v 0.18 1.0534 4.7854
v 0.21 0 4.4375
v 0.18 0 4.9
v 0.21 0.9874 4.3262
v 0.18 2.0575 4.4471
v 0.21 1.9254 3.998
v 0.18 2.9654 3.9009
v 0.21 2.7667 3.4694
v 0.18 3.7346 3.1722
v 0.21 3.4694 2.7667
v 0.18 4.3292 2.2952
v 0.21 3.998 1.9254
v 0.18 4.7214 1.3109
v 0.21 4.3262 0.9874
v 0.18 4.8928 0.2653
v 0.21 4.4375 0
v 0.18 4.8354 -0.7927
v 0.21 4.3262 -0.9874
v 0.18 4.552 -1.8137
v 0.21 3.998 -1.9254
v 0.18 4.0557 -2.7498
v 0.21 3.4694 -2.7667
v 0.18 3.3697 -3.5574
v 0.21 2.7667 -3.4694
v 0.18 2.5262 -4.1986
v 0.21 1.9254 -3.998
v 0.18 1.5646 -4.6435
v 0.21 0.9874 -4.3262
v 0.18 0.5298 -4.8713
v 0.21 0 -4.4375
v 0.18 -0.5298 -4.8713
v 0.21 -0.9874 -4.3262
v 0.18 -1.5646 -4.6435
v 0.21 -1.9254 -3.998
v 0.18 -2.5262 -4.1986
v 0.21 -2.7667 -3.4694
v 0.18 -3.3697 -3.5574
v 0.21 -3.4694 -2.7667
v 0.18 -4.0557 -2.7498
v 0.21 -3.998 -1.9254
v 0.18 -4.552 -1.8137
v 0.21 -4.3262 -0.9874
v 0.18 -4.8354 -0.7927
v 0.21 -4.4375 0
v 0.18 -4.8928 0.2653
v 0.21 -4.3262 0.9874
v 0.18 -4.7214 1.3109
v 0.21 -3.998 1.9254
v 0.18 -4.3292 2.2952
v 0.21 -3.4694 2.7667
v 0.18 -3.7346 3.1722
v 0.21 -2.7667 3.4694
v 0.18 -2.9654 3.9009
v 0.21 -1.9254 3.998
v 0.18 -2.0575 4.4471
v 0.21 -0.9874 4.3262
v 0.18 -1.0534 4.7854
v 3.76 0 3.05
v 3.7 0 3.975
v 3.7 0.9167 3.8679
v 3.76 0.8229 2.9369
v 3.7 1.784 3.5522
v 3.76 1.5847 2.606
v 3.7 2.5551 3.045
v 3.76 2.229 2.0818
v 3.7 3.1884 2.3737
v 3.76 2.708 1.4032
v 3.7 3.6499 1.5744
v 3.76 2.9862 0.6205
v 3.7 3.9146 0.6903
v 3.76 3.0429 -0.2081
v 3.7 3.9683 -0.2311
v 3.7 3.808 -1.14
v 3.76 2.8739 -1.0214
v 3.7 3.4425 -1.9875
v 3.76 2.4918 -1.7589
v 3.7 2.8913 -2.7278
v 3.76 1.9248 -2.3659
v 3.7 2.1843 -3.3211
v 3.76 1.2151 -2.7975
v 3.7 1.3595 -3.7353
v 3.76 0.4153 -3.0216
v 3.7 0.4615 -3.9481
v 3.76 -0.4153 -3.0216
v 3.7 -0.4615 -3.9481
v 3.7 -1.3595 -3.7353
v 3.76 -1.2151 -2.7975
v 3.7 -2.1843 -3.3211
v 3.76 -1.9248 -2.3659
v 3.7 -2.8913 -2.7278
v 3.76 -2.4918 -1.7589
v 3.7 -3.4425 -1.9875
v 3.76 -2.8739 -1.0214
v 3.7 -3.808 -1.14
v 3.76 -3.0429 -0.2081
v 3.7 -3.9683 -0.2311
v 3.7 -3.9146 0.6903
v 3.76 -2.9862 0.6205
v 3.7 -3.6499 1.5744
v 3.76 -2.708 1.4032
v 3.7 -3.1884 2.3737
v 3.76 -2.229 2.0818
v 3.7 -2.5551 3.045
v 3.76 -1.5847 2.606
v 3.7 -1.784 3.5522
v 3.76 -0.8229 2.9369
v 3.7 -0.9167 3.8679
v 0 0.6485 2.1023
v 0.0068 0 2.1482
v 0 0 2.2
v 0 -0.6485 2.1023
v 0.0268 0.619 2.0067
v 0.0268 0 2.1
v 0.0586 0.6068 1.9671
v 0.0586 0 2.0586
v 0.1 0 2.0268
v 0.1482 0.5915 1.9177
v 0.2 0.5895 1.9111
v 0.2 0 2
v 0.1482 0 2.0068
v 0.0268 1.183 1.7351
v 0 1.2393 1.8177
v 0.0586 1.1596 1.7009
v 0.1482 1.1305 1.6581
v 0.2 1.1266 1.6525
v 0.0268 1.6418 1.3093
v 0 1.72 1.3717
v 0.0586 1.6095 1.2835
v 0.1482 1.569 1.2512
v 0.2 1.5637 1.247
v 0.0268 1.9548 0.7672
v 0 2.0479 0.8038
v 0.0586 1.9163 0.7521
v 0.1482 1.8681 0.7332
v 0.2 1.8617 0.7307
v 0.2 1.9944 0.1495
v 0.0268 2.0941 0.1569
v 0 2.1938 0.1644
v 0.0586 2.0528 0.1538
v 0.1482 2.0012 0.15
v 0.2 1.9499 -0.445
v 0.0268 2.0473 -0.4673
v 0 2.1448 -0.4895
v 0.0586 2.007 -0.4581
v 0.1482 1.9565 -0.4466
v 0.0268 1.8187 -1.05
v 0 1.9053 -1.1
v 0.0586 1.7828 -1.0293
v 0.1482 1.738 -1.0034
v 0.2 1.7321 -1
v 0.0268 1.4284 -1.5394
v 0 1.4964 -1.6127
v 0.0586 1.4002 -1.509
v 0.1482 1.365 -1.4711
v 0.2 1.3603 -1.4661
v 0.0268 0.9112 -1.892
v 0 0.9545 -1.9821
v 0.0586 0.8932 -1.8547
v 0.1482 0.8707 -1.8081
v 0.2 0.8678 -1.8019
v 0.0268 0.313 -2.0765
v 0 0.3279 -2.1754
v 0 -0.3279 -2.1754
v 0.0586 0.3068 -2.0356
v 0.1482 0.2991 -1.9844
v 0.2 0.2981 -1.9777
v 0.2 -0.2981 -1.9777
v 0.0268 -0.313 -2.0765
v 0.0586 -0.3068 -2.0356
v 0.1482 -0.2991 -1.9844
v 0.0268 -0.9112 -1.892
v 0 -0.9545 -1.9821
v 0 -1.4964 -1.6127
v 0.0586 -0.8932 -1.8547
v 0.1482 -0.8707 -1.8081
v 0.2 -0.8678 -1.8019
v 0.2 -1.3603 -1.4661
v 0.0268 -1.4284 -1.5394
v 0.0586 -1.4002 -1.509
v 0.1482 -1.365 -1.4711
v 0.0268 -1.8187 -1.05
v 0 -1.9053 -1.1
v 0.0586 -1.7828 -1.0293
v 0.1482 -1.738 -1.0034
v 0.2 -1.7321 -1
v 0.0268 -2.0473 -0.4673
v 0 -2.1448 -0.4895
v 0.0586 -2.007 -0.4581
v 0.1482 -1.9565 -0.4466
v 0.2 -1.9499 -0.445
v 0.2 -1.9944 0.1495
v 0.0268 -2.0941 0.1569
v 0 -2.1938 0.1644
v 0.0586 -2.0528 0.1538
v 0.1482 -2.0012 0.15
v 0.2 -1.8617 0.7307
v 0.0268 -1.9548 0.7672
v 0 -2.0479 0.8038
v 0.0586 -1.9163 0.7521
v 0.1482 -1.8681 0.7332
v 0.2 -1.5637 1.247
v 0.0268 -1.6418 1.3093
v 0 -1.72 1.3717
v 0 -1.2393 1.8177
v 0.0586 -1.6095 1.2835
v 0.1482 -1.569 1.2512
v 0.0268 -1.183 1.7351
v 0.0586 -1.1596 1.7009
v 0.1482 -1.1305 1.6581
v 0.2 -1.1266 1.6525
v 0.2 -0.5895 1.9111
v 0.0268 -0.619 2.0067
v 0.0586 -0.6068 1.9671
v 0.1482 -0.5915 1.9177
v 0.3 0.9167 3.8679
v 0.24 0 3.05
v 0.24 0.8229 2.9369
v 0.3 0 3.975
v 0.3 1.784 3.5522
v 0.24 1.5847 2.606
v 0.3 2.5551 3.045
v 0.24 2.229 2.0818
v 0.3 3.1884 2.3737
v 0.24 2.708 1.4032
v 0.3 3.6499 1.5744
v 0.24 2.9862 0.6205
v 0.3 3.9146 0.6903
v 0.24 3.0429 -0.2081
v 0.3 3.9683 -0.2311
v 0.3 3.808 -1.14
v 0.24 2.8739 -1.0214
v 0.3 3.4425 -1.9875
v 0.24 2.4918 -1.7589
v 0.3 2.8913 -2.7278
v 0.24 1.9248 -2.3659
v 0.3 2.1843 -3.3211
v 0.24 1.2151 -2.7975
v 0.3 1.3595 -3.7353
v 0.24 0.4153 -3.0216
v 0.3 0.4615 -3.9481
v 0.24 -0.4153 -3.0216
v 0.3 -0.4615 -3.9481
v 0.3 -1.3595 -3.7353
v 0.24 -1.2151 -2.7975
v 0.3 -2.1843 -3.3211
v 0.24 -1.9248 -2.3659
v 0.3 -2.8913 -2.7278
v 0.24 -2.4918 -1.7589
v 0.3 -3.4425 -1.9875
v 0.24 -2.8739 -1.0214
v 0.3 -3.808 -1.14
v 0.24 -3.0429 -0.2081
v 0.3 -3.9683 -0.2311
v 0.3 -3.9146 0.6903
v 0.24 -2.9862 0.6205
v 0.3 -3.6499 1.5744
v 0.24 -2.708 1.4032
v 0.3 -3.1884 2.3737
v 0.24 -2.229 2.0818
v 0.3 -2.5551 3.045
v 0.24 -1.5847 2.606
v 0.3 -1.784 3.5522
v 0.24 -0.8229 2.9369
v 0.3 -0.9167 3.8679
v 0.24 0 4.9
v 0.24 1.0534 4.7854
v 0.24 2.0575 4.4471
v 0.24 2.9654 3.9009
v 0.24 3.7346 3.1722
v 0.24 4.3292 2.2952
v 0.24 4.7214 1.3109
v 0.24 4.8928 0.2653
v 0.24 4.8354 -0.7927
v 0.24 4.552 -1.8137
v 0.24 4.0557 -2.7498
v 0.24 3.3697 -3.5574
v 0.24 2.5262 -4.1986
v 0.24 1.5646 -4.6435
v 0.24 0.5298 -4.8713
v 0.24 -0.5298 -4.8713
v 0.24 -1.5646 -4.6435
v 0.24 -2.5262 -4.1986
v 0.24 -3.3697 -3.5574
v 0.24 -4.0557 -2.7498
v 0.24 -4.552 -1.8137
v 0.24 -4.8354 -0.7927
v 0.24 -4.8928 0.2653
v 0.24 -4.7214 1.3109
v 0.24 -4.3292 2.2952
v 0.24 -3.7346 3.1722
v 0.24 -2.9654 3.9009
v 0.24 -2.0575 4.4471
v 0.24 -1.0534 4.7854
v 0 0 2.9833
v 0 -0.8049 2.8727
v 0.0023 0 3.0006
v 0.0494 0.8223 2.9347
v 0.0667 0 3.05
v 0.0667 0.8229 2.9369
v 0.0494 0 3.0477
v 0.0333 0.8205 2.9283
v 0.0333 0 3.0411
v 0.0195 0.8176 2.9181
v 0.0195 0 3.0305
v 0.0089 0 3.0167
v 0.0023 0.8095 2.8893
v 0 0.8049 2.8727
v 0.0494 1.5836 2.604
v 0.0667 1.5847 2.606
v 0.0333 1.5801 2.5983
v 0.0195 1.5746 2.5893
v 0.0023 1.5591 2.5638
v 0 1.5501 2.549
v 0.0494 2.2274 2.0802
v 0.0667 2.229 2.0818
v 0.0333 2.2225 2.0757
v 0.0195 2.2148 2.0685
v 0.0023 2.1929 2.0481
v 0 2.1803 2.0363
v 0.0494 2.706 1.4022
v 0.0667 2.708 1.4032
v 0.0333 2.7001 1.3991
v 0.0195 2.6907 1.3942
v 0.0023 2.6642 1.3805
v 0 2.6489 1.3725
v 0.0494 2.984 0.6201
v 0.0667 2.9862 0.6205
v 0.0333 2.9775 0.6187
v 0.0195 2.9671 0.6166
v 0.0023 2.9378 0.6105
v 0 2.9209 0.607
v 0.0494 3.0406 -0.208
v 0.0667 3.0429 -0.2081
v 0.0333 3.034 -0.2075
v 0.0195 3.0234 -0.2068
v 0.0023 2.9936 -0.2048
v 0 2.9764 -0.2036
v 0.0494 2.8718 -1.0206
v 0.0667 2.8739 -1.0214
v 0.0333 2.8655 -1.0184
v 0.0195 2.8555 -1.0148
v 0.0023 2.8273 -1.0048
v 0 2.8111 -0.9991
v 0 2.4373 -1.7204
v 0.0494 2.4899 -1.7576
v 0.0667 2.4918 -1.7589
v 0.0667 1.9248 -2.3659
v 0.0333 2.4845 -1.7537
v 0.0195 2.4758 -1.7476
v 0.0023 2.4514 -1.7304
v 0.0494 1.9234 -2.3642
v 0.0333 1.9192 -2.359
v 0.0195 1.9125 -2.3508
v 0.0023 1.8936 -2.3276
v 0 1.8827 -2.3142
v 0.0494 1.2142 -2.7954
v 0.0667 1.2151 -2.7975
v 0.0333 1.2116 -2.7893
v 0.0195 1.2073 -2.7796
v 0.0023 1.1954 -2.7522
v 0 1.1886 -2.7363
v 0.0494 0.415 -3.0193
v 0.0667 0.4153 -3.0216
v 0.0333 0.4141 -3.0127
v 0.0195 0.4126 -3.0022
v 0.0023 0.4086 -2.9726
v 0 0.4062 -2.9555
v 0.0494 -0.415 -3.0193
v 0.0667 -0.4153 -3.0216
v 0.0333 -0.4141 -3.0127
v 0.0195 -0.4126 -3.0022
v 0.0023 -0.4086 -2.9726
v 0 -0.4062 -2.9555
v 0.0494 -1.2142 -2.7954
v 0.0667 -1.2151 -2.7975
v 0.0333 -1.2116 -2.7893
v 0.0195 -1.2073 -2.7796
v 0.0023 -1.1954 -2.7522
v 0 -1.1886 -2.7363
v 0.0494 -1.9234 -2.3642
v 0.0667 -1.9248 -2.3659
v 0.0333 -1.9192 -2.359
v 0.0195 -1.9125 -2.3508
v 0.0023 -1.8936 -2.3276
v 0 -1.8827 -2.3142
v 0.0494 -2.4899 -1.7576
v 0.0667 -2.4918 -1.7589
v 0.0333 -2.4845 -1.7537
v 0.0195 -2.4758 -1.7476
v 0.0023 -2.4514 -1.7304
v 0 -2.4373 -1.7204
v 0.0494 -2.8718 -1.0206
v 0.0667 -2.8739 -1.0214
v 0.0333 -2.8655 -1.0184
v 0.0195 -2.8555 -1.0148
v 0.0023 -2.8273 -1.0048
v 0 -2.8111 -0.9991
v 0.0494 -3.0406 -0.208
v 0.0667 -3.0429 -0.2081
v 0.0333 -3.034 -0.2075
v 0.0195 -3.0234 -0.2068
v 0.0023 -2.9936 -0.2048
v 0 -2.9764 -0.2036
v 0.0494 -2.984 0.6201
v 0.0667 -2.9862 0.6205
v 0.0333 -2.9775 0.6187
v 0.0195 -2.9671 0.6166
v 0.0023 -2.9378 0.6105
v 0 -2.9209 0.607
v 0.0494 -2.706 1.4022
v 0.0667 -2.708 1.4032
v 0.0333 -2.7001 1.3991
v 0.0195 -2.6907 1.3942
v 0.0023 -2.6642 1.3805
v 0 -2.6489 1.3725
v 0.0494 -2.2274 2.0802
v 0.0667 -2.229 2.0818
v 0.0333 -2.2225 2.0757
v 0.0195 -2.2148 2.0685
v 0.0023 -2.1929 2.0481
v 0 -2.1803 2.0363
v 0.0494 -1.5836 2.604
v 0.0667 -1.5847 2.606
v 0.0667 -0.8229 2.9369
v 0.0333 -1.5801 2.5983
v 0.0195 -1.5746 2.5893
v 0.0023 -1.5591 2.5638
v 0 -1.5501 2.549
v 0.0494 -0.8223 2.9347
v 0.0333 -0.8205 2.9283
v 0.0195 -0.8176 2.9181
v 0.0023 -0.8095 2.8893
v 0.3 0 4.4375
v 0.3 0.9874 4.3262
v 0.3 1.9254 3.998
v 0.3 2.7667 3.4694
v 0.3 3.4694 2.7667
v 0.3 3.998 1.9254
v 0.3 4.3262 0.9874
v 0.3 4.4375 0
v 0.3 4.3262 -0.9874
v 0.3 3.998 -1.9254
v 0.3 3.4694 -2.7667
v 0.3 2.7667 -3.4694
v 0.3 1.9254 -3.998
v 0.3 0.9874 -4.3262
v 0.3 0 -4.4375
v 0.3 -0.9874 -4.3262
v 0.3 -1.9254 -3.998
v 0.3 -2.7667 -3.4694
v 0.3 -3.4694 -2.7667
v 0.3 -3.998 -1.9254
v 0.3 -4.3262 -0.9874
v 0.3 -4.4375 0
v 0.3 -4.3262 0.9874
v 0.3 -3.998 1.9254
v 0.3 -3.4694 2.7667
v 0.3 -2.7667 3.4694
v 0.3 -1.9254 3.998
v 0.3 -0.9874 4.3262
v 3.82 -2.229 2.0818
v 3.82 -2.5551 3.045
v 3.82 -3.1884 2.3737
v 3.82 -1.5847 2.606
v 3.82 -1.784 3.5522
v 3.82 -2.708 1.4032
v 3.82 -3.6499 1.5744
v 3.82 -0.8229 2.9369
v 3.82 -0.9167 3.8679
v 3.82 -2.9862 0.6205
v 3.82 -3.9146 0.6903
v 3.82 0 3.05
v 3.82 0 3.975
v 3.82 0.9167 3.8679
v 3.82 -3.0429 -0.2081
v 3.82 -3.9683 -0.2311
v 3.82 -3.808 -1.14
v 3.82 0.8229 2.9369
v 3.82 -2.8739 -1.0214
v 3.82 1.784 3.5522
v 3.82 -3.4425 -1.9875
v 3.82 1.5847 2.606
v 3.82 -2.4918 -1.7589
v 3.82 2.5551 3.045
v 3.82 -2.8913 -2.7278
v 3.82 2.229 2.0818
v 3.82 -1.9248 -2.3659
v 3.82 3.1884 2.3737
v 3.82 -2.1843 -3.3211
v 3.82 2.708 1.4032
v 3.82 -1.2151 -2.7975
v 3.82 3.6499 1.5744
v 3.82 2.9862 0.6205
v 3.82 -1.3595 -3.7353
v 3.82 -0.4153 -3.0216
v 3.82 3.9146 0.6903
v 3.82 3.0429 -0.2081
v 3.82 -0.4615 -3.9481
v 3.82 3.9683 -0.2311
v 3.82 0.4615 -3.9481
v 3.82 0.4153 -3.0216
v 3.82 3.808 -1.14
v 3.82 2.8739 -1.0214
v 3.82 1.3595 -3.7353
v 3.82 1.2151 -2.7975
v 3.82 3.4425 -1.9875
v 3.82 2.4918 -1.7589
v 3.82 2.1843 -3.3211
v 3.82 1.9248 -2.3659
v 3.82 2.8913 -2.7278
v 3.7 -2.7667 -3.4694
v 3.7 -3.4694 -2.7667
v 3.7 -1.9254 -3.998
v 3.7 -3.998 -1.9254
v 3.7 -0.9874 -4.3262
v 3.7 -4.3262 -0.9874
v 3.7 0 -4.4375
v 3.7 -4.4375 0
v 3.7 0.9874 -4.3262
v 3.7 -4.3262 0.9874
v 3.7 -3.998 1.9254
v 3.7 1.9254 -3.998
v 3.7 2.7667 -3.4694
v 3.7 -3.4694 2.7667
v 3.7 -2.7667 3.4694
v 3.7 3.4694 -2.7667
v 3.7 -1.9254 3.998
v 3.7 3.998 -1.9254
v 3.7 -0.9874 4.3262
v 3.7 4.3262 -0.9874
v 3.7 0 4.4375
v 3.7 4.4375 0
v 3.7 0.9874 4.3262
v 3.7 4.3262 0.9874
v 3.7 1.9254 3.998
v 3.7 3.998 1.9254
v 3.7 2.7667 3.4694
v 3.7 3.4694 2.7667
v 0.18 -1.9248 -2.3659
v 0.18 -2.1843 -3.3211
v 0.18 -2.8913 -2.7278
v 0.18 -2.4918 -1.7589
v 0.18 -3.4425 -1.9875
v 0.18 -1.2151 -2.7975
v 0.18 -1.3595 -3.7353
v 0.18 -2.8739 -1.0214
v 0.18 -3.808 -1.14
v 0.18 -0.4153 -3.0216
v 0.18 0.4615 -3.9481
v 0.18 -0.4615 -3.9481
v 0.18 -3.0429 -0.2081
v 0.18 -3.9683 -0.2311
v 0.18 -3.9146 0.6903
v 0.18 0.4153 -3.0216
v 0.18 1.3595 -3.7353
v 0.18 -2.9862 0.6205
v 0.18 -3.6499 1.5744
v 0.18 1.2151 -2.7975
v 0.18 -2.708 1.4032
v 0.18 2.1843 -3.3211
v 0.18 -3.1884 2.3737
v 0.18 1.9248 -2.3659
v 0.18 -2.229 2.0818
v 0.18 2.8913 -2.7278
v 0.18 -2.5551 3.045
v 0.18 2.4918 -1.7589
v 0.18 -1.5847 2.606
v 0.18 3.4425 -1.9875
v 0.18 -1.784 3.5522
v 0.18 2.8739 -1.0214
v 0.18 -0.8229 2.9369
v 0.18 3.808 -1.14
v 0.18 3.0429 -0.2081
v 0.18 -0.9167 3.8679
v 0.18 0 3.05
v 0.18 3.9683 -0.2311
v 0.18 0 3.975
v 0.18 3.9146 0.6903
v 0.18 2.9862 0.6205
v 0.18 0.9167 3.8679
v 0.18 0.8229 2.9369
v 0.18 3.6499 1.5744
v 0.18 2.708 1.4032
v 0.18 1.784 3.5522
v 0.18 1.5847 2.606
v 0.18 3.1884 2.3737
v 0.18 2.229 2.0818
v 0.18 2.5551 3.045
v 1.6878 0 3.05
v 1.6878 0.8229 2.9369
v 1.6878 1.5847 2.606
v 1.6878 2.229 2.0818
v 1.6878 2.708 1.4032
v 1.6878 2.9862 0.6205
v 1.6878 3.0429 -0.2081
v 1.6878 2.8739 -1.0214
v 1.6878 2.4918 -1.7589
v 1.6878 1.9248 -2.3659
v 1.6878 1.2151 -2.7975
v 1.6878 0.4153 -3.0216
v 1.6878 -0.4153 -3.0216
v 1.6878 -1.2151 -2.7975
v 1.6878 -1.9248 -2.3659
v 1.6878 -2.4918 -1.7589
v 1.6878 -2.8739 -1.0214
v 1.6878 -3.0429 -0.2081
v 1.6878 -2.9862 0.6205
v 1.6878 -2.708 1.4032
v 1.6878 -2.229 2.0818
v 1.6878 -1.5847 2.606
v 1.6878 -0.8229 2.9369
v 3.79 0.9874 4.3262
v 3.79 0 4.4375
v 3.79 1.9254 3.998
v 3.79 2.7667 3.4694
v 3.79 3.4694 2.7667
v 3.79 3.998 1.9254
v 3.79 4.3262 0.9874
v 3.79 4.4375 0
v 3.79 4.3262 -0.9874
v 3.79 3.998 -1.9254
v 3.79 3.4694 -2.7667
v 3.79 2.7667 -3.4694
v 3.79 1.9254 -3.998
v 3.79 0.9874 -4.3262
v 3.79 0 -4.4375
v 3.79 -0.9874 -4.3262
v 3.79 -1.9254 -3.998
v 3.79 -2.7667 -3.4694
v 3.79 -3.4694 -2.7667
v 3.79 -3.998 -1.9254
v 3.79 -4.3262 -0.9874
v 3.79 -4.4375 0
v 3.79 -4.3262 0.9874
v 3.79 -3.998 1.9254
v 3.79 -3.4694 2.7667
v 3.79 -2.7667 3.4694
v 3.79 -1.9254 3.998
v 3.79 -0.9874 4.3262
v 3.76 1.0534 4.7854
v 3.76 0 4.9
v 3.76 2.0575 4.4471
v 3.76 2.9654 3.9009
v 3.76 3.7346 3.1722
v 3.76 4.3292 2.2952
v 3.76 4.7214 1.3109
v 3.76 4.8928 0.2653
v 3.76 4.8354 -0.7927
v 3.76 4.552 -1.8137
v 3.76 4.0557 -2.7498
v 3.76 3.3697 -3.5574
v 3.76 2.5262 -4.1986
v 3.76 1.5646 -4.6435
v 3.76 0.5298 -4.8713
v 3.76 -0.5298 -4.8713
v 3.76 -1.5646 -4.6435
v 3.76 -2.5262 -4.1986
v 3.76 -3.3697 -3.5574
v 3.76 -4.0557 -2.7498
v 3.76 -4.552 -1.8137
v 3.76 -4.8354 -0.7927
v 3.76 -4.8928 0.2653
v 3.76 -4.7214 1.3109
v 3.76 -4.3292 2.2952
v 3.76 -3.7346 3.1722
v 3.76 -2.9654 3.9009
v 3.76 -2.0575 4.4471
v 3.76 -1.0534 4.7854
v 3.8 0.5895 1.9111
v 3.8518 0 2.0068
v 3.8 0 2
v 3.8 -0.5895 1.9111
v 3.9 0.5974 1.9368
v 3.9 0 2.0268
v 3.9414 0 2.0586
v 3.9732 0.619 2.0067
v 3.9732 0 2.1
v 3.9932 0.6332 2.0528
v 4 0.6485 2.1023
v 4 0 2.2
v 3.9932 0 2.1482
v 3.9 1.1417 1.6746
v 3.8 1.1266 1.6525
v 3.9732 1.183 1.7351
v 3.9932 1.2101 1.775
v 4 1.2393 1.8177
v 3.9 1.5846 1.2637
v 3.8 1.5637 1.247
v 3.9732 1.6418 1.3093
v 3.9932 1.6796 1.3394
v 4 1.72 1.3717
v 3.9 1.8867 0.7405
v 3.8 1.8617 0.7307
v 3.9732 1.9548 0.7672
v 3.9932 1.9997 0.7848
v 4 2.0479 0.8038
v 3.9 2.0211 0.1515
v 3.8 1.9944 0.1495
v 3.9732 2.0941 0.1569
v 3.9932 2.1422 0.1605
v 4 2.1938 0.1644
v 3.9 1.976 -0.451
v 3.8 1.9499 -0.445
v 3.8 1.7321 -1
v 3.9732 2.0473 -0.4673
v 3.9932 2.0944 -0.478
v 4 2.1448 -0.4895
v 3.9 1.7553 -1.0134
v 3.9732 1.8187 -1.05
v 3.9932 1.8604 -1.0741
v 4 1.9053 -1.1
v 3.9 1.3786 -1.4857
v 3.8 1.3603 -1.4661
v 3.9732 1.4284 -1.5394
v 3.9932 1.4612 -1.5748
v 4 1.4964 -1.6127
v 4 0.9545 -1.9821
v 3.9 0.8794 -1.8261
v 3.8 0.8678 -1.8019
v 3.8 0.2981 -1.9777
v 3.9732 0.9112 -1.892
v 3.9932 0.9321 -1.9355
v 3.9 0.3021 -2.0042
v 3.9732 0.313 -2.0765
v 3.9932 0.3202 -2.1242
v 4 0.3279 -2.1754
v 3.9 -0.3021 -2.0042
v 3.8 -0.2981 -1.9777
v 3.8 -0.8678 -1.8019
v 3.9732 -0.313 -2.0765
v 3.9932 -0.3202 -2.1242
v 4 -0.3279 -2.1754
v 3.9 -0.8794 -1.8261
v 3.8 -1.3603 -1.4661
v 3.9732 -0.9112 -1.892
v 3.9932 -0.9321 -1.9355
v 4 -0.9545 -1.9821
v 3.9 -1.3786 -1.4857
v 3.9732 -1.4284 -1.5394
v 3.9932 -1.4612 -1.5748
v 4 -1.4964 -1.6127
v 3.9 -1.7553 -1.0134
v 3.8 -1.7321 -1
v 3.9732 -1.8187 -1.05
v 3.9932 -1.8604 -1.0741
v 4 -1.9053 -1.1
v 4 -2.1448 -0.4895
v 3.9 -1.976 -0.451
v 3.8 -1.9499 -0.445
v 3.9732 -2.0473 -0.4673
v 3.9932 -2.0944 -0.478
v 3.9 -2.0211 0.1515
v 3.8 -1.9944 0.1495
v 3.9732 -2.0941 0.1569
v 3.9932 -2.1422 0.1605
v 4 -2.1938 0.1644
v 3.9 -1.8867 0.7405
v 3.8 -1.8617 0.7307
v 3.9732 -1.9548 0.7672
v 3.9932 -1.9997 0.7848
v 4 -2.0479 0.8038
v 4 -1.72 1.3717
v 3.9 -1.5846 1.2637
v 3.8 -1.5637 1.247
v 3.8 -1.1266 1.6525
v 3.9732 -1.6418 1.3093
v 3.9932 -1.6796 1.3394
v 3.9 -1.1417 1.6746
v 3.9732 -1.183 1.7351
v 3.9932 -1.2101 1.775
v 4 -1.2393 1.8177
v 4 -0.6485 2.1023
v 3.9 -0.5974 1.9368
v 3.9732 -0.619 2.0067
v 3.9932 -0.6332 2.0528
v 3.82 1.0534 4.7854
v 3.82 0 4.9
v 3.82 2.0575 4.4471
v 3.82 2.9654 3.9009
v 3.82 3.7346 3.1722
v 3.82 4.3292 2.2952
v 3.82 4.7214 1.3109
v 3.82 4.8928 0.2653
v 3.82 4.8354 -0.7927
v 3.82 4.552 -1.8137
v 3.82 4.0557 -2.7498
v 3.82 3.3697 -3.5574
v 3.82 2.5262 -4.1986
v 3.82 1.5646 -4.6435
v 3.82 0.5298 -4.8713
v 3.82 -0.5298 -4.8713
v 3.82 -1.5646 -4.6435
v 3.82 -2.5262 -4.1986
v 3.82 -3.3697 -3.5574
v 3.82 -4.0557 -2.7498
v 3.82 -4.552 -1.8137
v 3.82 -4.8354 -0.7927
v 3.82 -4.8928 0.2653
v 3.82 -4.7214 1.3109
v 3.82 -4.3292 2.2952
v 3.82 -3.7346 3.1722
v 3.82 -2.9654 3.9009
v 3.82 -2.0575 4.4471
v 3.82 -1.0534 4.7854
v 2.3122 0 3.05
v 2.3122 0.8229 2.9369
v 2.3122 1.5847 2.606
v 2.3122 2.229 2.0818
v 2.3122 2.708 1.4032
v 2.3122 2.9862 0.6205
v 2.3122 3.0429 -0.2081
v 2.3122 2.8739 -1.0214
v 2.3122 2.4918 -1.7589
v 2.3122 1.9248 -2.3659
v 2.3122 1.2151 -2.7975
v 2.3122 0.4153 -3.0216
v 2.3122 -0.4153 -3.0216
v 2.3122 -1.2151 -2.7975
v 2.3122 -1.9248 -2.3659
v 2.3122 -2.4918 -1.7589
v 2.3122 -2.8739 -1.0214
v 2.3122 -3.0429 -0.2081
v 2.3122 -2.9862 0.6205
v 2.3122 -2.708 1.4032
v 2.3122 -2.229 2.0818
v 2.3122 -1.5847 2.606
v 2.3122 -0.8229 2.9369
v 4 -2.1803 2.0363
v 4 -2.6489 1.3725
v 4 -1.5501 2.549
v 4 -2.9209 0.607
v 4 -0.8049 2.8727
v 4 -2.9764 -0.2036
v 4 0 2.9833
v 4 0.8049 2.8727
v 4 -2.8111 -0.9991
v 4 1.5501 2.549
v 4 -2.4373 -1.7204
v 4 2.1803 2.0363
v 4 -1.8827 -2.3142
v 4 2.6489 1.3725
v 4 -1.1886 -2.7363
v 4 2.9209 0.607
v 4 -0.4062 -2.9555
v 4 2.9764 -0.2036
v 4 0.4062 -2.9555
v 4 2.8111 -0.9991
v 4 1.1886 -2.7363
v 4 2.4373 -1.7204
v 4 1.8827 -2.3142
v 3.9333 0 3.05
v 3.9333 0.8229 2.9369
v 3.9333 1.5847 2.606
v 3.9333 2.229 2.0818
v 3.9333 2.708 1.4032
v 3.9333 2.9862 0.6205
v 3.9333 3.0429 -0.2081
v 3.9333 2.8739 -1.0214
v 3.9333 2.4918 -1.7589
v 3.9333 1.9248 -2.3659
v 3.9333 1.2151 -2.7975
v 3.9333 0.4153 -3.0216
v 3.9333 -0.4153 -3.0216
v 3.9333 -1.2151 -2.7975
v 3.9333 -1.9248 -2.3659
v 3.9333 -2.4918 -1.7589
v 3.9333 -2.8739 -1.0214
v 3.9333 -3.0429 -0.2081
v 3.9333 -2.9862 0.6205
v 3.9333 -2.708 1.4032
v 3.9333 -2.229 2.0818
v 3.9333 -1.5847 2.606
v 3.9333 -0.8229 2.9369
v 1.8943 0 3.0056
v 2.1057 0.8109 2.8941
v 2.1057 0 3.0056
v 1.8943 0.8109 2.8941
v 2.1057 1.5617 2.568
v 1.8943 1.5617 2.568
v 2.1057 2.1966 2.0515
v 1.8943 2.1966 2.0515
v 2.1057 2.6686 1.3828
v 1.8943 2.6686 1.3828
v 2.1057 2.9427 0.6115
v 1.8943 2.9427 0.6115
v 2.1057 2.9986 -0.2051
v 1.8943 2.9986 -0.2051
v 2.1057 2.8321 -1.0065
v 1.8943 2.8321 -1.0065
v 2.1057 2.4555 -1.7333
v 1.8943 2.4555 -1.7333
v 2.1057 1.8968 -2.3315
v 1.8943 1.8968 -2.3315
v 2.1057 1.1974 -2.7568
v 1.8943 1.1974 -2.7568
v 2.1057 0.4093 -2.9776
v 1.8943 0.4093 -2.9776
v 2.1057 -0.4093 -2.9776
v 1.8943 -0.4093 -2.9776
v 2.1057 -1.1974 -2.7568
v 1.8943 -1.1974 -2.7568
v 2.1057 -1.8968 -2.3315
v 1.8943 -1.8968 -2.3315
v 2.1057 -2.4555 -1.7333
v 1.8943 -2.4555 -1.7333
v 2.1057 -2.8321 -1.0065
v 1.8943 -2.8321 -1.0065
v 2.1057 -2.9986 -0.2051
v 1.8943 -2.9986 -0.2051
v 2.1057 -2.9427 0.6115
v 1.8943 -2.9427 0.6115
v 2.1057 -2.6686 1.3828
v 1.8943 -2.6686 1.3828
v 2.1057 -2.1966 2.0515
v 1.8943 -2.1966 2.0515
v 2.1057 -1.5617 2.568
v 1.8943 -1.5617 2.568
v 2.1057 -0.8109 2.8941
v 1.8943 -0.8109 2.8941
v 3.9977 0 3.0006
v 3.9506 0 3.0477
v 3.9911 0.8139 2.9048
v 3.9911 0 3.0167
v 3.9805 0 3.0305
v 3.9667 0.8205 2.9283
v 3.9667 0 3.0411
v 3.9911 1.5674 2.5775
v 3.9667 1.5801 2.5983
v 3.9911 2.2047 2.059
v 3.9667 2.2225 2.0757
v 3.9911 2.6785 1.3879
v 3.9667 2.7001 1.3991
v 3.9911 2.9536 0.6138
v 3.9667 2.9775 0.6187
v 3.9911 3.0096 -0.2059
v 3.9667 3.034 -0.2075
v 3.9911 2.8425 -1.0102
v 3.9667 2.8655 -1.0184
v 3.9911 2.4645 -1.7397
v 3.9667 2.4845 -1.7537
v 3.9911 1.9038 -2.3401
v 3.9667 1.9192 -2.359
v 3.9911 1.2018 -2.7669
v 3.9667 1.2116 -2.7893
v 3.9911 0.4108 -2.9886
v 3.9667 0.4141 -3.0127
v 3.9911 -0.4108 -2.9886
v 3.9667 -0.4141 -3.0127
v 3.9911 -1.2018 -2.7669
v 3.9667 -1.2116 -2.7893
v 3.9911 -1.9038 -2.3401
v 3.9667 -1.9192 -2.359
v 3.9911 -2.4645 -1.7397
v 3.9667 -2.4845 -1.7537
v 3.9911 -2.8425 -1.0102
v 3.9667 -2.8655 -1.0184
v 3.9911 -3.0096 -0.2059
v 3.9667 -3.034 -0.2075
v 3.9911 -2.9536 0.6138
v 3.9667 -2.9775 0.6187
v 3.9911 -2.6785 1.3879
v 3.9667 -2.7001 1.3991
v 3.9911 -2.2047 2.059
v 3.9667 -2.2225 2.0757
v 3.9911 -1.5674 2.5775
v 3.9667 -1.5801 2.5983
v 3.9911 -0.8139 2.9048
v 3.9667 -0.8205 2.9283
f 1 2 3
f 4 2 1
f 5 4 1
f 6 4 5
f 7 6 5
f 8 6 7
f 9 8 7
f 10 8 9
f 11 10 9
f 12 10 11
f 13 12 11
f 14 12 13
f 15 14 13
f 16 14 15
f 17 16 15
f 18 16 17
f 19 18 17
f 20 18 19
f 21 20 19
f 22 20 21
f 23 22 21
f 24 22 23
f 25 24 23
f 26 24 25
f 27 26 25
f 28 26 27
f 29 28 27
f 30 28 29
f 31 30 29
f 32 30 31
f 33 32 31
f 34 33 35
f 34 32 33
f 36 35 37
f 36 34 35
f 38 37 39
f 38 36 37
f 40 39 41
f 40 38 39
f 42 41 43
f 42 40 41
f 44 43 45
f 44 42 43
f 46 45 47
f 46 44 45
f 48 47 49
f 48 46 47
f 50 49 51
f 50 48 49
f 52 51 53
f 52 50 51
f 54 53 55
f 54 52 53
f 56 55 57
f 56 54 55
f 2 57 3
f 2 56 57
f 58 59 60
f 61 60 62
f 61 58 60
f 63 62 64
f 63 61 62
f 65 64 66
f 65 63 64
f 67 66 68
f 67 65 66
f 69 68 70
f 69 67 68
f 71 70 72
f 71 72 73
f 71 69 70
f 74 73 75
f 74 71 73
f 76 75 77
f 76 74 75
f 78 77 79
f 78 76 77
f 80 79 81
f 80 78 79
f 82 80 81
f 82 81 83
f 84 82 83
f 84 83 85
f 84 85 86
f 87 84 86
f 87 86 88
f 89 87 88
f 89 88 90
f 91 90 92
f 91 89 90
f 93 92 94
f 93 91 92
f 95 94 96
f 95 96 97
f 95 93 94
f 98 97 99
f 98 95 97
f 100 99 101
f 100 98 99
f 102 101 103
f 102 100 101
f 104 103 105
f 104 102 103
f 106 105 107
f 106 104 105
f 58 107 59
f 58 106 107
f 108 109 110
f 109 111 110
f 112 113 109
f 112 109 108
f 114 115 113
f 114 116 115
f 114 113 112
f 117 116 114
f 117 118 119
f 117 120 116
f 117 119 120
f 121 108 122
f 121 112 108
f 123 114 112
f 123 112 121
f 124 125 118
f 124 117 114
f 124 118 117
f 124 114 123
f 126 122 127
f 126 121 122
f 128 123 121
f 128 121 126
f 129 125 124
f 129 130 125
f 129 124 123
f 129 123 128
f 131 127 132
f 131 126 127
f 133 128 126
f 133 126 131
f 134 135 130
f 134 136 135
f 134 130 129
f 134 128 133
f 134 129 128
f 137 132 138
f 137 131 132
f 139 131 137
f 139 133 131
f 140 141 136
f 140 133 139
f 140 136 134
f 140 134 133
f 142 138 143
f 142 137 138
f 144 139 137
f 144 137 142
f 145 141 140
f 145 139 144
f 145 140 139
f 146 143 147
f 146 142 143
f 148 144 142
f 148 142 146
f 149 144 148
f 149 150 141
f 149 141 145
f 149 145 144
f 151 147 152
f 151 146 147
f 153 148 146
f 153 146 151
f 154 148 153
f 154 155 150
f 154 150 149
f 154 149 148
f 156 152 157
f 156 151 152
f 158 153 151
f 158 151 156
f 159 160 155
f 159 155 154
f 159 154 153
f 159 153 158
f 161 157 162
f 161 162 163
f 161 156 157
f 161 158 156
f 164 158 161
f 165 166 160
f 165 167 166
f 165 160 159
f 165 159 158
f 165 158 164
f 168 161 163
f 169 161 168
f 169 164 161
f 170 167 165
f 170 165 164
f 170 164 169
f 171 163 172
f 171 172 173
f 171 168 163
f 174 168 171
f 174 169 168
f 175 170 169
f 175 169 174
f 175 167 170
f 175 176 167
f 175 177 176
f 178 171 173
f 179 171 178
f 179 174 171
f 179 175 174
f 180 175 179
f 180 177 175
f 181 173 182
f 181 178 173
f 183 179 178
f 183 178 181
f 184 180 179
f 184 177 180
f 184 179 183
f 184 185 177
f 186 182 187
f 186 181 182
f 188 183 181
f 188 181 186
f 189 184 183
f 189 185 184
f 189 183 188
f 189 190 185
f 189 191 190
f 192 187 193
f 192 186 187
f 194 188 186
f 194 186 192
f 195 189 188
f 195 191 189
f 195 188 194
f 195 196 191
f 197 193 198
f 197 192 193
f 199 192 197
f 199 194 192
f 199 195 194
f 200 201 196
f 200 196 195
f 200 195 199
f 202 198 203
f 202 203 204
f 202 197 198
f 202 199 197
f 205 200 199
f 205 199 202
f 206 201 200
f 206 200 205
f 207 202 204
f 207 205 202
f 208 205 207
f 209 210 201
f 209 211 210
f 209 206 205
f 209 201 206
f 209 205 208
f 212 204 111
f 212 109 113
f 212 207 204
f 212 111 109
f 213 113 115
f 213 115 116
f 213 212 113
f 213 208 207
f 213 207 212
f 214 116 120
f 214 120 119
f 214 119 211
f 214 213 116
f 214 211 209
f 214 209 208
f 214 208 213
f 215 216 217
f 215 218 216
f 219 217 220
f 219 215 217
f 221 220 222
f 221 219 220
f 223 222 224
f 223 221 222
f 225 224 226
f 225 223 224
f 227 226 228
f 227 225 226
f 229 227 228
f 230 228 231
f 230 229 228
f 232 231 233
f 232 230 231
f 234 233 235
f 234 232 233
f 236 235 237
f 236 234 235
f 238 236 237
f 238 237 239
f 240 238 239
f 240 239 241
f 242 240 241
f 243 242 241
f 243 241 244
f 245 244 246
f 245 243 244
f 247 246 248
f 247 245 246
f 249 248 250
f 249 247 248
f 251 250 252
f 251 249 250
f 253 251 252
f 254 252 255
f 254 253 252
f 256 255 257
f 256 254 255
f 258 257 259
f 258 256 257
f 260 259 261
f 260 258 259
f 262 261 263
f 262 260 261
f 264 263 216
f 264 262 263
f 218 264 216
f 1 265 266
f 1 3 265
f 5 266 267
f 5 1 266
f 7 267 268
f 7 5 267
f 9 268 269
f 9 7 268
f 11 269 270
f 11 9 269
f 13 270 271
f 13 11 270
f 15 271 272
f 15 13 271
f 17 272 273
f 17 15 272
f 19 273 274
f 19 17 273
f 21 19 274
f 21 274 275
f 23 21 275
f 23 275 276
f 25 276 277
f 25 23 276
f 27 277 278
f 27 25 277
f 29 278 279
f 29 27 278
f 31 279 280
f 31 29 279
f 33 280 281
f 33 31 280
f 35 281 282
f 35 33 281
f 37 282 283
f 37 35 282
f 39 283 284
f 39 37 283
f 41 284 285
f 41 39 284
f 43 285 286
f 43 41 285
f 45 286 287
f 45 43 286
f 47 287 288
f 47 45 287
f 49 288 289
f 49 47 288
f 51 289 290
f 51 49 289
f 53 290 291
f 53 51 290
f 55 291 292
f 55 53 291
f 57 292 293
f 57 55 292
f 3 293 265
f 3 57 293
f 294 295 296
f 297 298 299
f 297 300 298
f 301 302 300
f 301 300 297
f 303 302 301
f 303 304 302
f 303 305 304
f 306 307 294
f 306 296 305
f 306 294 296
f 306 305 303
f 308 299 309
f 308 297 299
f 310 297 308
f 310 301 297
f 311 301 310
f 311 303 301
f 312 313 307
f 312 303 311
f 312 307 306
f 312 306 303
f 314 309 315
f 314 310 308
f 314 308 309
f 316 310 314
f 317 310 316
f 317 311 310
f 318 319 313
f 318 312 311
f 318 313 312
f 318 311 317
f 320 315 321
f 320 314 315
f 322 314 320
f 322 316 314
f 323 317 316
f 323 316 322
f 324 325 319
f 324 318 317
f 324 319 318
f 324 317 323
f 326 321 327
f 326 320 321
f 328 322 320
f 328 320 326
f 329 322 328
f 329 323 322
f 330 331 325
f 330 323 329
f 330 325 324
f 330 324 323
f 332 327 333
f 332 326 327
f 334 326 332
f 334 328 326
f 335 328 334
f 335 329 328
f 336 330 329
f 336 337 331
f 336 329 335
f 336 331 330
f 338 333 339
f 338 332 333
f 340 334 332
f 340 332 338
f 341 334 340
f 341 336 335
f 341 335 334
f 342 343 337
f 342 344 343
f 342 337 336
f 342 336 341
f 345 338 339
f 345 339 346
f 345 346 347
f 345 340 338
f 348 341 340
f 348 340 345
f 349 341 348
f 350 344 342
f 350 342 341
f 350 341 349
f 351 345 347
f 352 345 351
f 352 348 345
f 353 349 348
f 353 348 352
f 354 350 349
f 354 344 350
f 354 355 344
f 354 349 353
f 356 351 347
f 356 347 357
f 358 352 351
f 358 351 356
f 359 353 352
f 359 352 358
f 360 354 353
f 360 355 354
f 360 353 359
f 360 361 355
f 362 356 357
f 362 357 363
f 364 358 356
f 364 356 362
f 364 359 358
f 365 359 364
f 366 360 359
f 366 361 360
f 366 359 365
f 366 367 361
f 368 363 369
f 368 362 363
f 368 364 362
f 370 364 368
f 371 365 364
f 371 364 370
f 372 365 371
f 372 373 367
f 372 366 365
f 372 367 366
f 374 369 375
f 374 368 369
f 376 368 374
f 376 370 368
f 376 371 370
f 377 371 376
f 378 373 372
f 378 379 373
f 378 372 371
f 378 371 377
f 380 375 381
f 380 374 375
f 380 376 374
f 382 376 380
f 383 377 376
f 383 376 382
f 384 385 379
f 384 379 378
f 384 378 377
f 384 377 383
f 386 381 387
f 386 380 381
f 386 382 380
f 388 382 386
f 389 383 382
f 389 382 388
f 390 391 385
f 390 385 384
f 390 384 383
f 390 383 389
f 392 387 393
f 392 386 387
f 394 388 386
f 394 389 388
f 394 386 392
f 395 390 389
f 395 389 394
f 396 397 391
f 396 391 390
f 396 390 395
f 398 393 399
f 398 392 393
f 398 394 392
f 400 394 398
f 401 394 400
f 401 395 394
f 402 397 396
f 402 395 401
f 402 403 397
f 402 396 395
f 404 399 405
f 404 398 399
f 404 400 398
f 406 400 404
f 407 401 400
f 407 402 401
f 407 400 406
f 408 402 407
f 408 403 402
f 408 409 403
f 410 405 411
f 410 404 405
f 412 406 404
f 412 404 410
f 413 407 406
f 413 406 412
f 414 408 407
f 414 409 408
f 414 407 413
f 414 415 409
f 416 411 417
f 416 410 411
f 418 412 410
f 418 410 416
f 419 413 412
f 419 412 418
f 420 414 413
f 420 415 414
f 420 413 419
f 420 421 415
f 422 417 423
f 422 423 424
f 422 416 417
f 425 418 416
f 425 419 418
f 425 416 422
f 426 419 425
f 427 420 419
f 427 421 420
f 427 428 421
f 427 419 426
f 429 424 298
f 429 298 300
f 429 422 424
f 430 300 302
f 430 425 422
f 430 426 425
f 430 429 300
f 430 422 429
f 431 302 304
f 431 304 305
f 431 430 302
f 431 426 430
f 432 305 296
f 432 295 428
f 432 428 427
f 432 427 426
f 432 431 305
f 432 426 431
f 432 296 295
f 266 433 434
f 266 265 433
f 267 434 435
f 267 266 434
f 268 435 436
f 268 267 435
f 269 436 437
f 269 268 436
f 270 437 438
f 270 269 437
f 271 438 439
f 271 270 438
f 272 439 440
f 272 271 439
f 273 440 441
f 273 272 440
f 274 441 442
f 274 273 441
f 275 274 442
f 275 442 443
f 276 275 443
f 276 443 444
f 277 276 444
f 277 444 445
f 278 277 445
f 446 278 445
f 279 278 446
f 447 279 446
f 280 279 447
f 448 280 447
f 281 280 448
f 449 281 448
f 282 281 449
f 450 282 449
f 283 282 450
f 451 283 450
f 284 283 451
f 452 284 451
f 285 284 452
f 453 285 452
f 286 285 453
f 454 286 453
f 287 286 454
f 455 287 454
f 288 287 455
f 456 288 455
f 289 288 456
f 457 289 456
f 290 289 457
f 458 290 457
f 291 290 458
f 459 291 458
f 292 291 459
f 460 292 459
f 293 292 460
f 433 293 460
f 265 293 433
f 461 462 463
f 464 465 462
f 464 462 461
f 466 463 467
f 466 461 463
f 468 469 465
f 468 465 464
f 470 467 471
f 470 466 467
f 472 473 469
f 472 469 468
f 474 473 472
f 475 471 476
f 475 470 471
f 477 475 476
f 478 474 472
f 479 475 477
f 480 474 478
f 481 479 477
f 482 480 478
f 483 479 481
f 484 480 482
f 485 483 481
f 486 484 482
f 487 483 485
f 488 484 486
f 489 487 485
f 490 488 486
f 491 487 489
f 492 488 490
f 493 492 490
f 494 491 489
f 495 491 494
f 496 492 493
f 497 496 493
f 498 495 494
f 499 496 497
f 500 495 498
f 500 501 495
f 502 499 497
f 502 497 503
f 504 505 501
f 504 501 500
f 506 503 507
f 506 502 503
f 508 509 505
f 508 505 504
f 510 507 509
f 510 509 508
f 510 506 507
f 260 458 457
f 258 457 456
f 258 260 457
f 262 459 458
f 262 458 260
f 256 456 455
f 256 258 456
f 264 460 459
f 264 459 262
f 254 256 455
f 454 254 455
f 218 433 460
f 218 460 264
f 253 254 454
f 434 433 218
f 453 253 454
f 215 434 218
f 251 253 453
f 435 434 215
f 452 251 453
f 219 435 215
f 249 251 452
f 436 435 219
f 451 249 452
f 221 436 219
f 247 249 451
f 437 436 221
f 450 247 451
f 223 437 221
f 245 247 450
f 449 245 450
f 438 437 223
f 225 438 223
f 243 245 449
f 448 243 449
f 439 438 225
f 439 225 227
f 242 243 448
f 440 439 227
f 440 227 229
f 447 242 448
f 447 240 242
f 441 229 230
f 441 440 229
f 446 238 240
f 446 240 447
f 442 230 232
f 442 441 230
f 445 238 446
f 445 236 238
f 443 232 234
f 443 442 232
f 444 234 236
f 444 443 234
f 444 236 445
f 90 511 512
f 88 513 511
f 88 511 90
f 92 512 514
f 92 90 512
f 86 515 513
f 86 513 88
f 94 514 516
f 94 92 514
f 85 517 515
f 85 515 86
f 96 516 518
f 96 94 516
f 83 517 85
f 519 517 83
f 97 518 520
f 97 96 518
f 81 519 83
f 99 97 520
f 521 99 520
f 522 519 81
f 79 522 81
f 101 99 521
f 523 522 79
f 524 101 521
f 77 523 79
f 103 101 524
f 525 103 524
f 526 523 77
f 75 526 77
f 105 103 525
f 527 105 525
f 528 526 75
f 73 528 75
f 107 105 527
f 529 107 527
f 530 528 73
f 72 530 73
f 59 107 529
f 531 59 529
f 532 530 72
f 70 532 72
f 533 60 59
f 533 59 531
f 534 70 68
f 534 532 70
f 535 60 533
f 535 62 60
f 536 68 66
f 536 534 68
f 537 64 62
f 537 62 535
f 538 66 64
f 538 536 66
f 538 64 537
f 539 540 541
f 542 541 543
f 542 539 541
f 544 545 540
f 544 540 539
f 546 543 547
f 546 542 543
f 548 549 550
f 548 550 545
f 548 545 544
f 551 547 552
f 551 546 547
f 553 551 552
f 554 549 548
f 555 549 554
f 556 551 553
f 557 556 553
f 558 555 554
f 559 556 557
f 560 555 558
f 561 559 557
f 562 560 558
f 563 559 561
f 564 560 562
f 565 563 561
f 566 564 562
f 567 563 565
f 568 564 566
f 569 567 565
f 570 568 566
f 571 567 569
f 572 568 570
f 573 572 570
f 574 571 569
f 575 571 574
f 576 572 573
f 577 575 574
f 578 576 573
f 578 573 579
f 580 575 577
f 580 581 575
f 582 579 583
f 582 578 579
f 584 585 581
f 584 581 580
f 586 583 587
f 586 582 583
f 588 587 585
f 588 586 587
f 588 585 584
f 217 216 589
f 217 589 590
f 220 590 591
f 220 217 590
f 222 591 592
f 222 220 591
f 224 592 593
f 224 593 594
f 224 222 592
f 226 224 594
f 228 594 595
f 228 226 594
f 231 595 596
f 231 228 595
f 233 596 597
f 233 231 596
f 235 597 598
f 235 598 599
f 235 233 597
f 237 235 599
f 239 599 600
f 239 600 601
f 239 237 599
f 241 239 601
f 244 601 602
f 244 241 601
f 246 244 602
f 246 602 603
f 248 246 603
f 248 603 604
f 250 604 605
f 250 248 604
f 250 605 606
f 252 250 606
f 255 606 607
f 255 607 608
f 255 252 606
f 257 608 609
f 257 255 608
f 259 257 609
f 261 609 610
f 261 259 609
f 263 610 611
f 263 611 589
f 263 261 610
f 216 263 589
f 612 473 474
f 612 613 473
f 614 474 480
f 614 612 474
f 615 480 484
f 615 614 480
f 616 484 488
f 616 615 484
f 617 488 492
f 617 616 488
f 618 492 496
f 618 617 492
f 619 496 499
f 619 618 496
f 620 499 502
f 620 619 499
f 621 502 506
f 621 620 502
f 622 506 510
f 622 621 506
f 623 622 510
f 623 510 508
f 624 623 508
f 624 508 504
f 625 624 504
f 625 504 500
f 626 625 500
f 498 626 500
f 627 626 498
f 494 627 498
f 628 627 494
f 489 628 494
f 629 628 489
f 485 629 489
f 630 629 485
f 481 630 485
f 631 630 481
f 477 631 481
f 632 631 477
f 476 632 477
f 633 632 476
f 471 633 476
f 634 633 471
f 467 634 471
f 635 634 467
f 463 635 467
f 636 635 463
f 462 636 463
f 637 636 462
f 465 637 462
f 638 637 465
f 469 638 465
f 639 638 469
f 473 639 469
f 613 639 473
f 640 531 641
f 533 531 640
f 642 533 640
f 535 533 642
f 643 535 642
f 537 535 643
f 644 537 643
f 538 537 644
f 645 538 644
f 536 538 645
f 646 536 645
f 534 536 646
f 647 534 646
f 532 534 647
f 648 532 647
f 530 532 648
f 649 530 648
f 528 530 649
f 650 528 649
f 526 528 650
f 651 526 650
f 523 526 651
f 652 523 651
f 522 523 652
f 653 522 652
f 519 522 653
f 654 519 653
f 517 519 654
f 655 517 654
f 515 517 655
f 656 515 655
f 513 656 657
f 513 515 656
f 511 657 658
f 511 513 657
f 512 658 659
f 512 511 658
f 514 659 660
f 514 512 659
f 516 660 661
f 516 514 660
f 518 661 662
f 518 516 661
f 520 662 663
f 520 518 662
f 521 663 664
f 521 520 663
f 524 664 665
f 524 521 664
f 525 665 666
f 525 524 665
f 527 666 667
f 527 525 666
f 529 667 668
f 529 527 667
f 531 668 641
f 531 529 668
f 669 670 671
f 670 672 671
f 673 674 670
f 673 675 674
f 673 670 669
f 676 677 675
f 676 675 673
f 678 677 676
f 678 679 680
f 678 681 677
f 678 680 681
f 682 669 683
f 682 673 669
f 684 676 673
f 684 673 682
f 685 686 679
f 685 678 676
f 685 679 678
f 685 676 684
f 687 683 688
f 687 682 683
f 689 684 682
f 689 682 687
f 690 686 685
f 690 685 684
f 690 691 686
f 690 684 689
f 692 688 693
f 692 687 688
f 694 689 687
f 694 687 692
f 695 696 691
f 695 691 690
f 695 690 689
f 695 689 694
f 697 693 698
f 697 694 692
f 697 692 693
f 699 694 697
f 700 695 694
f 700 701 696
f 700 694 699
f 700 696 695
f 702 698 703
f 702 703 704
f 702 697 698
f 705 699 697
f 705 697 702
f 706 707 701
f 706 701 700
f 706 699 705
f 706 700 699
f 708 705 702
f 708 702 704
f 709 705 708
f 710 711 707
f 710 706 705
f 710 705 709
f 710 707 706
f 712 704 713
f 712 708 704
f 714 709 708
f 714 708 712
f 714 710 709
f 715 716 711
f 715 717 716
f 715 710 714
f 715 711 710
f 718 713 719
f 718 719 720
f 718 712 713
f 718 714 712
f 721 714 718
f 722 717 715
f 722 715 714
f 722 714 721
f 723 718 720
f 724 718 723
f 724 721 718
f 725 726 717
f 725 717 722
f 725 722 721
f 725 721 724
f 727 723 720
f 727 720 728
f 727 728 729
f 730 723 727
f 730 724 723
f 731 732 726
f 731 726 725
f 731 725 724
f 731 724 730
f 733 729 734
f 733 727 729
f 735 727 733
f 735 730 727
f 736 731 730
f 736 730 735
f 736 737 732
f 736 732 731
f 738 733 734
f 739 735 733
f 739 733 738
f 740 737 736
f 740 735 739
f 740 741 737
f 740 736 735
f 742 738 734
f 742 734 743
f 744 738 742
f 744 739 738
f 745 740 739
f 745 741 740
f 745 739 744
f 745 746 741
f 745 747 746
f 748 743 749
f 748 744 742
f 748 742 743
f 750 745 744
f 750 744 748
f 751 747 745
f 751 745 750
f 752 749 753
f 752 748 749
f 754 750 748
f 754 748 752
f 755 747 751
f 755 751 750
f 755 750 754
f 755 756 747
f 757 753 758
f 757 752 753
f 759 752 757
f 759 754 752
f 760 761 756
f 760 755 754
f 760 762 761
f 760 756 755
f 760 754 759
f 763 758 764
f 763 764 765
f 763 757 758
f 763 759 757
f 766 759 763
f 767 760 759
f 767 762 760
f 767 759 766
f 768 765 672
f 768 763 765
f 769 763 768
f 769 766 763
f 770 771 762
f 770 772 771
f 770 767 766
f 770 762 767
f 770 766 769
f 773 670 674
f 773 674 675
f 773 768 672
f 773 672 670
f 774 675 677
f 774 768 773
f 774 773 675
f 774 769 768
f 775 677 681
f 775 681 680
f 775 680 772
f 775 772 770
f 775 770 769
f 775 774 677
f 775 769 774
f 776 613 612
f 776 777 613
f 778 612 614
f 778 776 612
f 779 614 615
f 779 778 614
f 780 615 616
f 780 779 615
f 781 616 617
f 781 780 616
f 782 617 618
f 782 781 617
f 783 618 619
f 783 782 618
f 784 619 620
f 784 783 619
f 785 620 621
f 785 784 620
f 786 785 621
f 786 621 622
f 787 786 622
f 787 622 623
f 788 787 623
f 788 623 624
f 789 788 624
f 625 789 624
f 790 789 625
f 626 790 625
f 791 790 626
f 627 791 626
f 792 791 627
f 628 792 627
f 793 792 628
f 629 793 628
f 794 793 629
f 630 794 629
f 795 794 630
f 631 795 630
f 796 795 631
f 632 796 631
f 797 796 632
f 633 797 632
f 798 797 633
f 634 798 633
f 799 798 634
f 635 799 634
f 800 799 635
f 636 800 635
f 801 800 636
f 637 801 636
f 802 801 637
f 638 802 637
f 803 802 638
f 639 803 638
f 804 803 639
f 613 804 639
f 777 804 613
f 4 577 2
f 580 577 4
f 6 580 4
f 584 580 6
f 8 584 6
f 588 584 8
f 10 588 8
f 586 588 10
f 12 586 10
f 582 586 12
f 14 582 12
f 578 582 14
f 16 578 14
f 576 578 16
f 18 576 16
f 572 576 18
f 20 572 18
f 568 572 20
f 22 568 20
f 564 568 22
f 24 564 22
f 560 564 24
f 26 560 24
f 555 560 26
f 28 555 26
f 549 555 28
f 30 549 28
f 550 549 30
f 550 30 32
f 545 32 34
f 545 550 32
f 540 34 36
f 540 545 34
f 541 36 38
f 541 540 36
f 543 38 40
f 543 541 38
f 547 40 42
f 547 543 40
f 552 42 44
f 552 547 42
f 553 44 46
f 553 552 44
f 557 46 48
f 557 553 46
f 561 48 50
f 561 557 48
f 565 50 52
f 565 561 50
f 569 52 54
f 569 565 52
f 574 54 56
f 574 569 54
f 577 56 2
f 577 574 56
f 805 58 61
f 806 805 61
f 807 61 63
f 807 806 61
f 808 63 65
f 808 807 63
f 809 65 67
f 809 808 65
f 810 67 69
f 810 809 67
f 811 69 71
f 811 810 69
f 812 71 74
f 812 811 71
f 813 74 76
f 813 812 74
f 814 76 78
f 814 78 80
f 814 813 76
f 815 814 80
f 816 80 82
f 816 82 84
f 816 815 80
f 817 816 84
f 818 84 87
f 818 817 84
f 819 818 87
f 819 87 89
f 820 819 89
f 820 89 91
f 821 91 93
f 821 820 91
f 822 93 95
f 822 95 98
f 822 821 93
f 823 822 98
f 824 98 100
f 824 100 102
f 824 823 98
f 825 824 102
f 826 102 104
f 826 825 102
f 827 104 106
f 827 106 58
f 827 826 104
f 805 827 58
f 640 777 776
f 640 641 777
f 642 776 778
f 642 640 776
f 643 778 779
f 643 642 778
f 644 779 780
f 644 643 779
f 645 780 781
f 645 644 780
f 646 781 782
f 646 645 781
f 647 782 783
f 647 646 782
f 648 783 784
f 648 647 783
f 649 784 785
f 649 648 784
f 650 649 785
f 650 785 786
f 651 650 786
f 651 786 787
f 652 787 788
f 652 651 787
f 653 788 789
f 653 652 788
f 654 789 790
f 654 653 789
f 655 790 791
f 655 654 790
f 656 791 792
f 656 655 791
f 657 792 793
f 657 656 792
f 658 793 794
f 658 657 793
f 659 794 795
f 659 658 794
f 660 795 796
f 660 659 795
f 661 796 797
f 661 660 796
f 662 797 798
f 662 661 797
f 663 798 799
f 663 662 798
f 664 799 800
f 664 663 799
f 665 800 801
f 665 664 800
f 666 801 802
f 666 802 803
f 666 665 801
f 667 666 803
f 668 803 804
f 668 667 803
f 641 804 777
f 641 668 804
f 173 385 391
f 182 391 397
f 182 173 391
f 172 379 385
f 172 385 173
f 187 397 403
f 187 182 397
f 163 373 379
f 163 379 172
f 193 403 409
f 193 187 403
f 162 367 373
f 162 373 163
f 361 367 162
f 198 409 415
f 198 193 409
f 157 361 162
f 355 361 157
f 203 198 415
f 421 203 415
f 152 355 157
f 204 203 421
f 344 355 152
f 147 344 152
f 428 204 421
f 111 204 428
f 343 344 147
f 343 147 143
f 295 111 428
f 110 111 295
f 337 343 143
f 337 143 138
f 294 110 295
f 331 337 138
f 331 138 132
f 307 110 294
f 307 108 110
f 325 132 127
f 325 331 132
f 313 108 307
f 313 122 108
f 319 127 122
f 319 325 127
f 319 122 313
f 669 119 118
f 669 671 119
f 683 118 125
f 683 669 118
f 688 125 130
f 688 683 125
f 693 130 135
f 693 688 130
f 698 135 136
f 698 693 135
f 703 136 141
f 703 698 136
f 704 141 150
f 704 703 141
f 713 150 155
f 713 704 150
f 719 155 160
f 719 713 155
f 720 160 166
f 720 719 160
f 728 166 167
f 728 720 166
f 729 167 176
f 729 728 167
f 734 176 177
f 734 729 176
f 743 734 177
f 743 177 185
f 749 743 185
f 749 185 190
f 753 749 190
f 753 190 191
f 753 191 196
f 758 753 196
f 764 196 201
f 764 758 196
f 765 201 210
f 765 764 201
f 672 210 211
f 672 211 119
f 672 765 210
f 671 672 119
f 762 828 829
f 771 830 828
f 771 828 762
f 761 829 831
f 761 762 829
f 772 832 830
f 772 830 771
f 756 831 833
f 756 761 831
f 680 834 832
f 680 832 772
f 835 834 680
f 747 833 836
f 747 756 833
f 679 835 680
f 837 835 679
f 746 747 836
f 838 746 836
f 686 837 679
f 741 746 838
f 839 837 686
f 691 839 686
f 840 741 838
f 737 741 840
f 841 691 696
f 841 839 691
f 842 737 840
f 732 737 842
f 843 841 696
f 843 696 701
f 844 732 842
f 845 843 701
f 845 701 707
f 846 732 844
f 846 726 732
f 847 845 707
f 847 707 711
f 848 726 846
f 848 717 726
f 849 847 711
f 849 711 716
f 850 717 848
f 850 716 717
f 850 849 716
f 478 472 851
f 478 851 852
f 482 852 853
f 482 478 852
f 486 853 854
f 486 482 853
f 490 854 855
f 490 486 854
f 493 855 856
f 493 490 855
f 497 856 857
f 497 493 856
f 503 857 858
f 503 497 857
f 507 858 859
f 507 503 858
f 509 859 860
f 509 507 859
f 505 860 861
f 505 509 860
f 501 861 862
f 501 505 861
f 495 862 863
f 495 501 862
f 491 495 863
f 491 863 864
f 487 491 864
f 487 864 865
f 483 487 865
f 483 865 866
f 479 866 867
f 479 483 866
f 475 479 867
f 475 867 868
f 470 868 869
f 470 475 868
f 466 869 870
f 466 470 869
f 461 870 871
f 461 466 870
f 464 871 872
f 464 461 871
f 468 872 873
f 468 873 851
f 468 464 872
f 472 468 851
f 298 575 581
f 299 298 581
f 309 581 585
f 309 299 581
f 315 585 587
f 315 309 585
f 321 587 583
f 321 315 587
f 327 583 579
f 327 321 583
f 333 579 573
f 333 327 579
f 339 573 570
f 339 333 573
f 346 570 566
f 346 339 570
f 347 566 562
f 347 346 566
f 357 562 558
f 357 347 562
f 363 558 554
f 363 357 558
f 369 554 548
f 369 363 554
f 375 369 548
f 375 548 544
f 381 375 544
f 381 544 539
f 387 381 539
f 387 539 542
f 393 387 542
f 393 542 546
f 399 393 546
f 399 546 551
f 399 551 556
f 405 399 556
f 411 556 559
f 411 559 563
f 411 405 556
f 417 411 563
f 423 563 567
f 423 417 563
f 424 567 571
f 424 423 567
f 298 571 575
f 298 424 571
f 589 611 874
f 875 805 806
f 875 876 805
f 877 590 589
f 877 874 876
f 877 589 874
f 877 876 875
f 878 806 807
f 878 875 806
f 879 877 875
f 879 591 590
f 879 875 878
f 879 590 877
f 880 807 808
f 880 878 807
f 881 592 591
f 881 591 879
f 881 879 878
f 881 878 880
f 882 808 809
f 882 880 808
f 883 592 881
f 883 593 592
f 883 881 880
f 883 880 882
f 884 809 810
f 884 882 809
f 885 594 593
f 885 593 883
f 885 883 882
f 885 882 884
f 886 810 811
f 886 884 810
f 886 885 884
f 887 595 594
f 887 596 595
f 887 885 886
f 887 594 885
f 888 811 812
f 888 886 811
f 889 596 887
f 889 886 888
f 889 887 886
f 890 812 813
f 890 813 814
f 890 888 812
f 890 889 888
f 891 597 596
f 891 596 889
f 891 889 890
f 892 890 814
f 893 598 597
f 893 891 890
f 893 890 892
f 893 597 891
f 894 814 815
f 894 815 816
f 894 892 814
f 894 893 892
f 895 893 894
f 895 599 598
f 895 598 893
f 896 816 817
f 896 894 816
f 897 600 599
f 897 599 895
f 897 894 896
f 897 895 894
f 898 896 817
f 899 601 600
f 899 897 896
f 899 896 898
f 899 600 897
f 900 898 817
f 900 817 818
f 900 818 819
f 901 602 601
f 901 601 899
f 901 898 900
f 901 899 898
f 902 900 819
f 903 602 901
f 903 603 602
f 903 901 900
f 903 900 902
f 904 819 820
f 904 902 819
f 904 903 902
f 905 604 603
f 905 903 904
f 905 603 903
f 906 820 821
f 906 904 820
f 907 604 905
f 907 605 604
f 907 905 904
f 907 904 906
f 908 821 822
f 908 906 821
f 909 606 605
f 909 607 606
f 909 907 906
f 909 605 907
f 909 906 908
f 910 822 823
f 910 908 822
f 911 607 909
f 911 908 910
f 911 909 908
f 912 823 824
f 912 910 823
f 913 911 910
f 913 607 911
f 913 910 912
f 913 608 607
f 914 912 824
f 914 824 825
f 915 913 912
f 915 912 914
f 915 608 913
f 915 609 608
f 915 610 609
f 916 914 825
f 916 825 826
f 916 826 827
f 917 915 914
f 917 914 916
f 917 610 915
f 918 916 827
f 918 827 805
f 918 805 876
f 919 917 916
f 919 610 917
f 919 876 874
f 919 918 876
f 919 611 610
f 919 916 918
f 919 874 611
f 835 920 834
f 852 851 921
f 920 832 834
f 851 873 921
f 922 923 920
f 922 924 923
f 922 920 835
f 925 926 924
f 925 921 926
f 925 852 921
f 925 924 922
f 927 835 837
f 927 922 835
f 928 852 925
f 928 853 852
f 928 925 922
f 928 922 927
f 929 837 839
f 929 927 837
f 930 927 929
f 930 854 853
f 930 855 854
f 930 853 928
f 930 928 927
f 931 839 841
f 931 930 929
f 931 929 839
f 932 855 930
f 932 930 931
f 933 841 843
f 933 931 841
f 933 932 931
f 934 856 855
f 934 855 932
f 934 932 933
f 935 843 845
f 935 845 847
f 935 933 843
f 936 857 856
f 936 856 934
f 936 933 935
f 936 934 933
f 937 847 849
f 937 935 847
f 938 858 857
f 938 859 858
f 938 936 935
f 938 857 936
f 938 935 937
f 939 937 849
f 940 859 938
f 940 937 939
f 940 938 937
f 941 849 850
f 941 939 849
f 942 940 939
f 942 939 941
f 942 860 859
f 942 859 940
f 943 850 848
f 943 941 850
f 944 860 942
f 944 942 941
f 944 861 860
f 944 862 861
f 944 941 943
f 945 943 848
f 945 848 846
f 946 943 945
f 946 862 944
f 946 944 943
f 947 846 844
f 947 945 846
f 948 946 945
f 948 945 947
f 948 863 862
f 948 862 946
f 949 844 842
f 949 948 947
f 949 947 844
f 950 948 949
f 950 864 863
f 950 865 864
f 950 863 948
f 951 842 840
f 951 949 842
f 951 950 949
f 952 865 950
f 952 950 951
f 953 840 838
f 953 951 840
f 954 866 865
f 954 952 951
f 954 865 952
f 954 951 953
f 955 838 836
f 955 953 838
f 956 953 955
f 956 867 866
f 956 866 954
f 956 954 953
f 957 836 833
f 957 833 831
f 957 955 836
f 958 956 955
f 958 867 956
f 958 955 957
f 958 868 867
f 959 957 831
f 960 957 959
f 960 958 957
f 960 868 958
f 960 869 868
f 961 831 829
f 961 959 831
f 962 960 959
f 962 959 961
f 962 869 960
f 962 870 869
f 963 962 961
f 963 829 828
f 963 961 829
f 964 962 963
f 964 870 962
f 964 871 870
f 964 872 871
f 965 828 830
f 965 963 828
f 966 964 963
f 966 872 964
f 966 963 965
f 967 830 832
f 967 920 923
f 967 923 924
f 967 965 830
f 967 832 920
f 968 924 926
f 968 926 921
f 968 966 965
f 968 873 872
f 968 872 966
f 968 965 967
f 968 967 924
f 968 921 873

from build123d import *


with BuildPart() as part:
    # Sketch1 → Revolução1 (revolve)
    with BuildSketch(Plane.XY, mode=Mode.PRIVATE) as revolu_o1_sk:
        with BuildLine():
            Line((0, 2.983333333), (0, 2.2))
            ThreePointArc((0, 2.2), (0.058578644, 2.058578644), (0.2, 2))
            Line((0.2, 2), (3.8, 2))
            ThreePointArc((3.8, 2), (3.941421356, 2.058578644), (4, 2.2))
            Line((4, 2.2), (4, 2.983333333))
            ThreePointArc((4, 2.983333333), (3.980473785, 3.030473785), (3.933333333, 3.05))
            Line((3.933333333, 3.05), (2.3122499, 3.05))
            ThreePointArc((2.3122499, 3.05), (2, 3), (1.6877501, 3.05))
            Line((1.6877501, 3.05), (0.066666667, 3.05))
            ThreePointArc((0.066666667, 3.05), (0.019526215, 3.030473785), (0, 2.983333333))
        make_face()
    revolve(revolu_o1_sk.sketch.rotate(Axis((50, 0, 0), (-1, 0, 0)), 270), axis=Axis((50, 0, 0), (-1, 0, 0)))

    # Sketch2 → Revolução2 (revolve)
    with BuildSketch(Plane.XY, mode=Mode.PRIVATE) as revolu_o2_sk:
        Polygon((0.18, 4.9), (0.21, 4.4375), (0.18, 3.975), (0.18, 3.05), (0.24, 3.05), (0.3, 3.975), (0.3, 4.4375), (0.24, 4.9), align=None)
    revolve(revolu_o2_sk.sketch.rotate(Axis((50, 0, 0), (-1, 0, 0)), 270), axis=Axis((50, 0, 0), (-1, 0, 0)))

    # Sketch3 → Revolução3 (revolve)
    with BuildSketch(Plane.XY, mode=Mode.PRIVATE) as revolu_o3_sk:
        Polygon((3.7, 4.4375), (3.7, 3.975), (3.76, 3.05), (3.82, 3.05), (3.82, 3.975), (3.79, 4.4375), (3.82, 4.9), (3.76, 4.9), align=None)
    revolve(revolu_o3_sk.sketch.rotate(Axis((50, 0, 0), (-1, 0, 0)), 270), axis=Axis((50, 0, 0), (-1, 0, 0)))


solid = part.part
